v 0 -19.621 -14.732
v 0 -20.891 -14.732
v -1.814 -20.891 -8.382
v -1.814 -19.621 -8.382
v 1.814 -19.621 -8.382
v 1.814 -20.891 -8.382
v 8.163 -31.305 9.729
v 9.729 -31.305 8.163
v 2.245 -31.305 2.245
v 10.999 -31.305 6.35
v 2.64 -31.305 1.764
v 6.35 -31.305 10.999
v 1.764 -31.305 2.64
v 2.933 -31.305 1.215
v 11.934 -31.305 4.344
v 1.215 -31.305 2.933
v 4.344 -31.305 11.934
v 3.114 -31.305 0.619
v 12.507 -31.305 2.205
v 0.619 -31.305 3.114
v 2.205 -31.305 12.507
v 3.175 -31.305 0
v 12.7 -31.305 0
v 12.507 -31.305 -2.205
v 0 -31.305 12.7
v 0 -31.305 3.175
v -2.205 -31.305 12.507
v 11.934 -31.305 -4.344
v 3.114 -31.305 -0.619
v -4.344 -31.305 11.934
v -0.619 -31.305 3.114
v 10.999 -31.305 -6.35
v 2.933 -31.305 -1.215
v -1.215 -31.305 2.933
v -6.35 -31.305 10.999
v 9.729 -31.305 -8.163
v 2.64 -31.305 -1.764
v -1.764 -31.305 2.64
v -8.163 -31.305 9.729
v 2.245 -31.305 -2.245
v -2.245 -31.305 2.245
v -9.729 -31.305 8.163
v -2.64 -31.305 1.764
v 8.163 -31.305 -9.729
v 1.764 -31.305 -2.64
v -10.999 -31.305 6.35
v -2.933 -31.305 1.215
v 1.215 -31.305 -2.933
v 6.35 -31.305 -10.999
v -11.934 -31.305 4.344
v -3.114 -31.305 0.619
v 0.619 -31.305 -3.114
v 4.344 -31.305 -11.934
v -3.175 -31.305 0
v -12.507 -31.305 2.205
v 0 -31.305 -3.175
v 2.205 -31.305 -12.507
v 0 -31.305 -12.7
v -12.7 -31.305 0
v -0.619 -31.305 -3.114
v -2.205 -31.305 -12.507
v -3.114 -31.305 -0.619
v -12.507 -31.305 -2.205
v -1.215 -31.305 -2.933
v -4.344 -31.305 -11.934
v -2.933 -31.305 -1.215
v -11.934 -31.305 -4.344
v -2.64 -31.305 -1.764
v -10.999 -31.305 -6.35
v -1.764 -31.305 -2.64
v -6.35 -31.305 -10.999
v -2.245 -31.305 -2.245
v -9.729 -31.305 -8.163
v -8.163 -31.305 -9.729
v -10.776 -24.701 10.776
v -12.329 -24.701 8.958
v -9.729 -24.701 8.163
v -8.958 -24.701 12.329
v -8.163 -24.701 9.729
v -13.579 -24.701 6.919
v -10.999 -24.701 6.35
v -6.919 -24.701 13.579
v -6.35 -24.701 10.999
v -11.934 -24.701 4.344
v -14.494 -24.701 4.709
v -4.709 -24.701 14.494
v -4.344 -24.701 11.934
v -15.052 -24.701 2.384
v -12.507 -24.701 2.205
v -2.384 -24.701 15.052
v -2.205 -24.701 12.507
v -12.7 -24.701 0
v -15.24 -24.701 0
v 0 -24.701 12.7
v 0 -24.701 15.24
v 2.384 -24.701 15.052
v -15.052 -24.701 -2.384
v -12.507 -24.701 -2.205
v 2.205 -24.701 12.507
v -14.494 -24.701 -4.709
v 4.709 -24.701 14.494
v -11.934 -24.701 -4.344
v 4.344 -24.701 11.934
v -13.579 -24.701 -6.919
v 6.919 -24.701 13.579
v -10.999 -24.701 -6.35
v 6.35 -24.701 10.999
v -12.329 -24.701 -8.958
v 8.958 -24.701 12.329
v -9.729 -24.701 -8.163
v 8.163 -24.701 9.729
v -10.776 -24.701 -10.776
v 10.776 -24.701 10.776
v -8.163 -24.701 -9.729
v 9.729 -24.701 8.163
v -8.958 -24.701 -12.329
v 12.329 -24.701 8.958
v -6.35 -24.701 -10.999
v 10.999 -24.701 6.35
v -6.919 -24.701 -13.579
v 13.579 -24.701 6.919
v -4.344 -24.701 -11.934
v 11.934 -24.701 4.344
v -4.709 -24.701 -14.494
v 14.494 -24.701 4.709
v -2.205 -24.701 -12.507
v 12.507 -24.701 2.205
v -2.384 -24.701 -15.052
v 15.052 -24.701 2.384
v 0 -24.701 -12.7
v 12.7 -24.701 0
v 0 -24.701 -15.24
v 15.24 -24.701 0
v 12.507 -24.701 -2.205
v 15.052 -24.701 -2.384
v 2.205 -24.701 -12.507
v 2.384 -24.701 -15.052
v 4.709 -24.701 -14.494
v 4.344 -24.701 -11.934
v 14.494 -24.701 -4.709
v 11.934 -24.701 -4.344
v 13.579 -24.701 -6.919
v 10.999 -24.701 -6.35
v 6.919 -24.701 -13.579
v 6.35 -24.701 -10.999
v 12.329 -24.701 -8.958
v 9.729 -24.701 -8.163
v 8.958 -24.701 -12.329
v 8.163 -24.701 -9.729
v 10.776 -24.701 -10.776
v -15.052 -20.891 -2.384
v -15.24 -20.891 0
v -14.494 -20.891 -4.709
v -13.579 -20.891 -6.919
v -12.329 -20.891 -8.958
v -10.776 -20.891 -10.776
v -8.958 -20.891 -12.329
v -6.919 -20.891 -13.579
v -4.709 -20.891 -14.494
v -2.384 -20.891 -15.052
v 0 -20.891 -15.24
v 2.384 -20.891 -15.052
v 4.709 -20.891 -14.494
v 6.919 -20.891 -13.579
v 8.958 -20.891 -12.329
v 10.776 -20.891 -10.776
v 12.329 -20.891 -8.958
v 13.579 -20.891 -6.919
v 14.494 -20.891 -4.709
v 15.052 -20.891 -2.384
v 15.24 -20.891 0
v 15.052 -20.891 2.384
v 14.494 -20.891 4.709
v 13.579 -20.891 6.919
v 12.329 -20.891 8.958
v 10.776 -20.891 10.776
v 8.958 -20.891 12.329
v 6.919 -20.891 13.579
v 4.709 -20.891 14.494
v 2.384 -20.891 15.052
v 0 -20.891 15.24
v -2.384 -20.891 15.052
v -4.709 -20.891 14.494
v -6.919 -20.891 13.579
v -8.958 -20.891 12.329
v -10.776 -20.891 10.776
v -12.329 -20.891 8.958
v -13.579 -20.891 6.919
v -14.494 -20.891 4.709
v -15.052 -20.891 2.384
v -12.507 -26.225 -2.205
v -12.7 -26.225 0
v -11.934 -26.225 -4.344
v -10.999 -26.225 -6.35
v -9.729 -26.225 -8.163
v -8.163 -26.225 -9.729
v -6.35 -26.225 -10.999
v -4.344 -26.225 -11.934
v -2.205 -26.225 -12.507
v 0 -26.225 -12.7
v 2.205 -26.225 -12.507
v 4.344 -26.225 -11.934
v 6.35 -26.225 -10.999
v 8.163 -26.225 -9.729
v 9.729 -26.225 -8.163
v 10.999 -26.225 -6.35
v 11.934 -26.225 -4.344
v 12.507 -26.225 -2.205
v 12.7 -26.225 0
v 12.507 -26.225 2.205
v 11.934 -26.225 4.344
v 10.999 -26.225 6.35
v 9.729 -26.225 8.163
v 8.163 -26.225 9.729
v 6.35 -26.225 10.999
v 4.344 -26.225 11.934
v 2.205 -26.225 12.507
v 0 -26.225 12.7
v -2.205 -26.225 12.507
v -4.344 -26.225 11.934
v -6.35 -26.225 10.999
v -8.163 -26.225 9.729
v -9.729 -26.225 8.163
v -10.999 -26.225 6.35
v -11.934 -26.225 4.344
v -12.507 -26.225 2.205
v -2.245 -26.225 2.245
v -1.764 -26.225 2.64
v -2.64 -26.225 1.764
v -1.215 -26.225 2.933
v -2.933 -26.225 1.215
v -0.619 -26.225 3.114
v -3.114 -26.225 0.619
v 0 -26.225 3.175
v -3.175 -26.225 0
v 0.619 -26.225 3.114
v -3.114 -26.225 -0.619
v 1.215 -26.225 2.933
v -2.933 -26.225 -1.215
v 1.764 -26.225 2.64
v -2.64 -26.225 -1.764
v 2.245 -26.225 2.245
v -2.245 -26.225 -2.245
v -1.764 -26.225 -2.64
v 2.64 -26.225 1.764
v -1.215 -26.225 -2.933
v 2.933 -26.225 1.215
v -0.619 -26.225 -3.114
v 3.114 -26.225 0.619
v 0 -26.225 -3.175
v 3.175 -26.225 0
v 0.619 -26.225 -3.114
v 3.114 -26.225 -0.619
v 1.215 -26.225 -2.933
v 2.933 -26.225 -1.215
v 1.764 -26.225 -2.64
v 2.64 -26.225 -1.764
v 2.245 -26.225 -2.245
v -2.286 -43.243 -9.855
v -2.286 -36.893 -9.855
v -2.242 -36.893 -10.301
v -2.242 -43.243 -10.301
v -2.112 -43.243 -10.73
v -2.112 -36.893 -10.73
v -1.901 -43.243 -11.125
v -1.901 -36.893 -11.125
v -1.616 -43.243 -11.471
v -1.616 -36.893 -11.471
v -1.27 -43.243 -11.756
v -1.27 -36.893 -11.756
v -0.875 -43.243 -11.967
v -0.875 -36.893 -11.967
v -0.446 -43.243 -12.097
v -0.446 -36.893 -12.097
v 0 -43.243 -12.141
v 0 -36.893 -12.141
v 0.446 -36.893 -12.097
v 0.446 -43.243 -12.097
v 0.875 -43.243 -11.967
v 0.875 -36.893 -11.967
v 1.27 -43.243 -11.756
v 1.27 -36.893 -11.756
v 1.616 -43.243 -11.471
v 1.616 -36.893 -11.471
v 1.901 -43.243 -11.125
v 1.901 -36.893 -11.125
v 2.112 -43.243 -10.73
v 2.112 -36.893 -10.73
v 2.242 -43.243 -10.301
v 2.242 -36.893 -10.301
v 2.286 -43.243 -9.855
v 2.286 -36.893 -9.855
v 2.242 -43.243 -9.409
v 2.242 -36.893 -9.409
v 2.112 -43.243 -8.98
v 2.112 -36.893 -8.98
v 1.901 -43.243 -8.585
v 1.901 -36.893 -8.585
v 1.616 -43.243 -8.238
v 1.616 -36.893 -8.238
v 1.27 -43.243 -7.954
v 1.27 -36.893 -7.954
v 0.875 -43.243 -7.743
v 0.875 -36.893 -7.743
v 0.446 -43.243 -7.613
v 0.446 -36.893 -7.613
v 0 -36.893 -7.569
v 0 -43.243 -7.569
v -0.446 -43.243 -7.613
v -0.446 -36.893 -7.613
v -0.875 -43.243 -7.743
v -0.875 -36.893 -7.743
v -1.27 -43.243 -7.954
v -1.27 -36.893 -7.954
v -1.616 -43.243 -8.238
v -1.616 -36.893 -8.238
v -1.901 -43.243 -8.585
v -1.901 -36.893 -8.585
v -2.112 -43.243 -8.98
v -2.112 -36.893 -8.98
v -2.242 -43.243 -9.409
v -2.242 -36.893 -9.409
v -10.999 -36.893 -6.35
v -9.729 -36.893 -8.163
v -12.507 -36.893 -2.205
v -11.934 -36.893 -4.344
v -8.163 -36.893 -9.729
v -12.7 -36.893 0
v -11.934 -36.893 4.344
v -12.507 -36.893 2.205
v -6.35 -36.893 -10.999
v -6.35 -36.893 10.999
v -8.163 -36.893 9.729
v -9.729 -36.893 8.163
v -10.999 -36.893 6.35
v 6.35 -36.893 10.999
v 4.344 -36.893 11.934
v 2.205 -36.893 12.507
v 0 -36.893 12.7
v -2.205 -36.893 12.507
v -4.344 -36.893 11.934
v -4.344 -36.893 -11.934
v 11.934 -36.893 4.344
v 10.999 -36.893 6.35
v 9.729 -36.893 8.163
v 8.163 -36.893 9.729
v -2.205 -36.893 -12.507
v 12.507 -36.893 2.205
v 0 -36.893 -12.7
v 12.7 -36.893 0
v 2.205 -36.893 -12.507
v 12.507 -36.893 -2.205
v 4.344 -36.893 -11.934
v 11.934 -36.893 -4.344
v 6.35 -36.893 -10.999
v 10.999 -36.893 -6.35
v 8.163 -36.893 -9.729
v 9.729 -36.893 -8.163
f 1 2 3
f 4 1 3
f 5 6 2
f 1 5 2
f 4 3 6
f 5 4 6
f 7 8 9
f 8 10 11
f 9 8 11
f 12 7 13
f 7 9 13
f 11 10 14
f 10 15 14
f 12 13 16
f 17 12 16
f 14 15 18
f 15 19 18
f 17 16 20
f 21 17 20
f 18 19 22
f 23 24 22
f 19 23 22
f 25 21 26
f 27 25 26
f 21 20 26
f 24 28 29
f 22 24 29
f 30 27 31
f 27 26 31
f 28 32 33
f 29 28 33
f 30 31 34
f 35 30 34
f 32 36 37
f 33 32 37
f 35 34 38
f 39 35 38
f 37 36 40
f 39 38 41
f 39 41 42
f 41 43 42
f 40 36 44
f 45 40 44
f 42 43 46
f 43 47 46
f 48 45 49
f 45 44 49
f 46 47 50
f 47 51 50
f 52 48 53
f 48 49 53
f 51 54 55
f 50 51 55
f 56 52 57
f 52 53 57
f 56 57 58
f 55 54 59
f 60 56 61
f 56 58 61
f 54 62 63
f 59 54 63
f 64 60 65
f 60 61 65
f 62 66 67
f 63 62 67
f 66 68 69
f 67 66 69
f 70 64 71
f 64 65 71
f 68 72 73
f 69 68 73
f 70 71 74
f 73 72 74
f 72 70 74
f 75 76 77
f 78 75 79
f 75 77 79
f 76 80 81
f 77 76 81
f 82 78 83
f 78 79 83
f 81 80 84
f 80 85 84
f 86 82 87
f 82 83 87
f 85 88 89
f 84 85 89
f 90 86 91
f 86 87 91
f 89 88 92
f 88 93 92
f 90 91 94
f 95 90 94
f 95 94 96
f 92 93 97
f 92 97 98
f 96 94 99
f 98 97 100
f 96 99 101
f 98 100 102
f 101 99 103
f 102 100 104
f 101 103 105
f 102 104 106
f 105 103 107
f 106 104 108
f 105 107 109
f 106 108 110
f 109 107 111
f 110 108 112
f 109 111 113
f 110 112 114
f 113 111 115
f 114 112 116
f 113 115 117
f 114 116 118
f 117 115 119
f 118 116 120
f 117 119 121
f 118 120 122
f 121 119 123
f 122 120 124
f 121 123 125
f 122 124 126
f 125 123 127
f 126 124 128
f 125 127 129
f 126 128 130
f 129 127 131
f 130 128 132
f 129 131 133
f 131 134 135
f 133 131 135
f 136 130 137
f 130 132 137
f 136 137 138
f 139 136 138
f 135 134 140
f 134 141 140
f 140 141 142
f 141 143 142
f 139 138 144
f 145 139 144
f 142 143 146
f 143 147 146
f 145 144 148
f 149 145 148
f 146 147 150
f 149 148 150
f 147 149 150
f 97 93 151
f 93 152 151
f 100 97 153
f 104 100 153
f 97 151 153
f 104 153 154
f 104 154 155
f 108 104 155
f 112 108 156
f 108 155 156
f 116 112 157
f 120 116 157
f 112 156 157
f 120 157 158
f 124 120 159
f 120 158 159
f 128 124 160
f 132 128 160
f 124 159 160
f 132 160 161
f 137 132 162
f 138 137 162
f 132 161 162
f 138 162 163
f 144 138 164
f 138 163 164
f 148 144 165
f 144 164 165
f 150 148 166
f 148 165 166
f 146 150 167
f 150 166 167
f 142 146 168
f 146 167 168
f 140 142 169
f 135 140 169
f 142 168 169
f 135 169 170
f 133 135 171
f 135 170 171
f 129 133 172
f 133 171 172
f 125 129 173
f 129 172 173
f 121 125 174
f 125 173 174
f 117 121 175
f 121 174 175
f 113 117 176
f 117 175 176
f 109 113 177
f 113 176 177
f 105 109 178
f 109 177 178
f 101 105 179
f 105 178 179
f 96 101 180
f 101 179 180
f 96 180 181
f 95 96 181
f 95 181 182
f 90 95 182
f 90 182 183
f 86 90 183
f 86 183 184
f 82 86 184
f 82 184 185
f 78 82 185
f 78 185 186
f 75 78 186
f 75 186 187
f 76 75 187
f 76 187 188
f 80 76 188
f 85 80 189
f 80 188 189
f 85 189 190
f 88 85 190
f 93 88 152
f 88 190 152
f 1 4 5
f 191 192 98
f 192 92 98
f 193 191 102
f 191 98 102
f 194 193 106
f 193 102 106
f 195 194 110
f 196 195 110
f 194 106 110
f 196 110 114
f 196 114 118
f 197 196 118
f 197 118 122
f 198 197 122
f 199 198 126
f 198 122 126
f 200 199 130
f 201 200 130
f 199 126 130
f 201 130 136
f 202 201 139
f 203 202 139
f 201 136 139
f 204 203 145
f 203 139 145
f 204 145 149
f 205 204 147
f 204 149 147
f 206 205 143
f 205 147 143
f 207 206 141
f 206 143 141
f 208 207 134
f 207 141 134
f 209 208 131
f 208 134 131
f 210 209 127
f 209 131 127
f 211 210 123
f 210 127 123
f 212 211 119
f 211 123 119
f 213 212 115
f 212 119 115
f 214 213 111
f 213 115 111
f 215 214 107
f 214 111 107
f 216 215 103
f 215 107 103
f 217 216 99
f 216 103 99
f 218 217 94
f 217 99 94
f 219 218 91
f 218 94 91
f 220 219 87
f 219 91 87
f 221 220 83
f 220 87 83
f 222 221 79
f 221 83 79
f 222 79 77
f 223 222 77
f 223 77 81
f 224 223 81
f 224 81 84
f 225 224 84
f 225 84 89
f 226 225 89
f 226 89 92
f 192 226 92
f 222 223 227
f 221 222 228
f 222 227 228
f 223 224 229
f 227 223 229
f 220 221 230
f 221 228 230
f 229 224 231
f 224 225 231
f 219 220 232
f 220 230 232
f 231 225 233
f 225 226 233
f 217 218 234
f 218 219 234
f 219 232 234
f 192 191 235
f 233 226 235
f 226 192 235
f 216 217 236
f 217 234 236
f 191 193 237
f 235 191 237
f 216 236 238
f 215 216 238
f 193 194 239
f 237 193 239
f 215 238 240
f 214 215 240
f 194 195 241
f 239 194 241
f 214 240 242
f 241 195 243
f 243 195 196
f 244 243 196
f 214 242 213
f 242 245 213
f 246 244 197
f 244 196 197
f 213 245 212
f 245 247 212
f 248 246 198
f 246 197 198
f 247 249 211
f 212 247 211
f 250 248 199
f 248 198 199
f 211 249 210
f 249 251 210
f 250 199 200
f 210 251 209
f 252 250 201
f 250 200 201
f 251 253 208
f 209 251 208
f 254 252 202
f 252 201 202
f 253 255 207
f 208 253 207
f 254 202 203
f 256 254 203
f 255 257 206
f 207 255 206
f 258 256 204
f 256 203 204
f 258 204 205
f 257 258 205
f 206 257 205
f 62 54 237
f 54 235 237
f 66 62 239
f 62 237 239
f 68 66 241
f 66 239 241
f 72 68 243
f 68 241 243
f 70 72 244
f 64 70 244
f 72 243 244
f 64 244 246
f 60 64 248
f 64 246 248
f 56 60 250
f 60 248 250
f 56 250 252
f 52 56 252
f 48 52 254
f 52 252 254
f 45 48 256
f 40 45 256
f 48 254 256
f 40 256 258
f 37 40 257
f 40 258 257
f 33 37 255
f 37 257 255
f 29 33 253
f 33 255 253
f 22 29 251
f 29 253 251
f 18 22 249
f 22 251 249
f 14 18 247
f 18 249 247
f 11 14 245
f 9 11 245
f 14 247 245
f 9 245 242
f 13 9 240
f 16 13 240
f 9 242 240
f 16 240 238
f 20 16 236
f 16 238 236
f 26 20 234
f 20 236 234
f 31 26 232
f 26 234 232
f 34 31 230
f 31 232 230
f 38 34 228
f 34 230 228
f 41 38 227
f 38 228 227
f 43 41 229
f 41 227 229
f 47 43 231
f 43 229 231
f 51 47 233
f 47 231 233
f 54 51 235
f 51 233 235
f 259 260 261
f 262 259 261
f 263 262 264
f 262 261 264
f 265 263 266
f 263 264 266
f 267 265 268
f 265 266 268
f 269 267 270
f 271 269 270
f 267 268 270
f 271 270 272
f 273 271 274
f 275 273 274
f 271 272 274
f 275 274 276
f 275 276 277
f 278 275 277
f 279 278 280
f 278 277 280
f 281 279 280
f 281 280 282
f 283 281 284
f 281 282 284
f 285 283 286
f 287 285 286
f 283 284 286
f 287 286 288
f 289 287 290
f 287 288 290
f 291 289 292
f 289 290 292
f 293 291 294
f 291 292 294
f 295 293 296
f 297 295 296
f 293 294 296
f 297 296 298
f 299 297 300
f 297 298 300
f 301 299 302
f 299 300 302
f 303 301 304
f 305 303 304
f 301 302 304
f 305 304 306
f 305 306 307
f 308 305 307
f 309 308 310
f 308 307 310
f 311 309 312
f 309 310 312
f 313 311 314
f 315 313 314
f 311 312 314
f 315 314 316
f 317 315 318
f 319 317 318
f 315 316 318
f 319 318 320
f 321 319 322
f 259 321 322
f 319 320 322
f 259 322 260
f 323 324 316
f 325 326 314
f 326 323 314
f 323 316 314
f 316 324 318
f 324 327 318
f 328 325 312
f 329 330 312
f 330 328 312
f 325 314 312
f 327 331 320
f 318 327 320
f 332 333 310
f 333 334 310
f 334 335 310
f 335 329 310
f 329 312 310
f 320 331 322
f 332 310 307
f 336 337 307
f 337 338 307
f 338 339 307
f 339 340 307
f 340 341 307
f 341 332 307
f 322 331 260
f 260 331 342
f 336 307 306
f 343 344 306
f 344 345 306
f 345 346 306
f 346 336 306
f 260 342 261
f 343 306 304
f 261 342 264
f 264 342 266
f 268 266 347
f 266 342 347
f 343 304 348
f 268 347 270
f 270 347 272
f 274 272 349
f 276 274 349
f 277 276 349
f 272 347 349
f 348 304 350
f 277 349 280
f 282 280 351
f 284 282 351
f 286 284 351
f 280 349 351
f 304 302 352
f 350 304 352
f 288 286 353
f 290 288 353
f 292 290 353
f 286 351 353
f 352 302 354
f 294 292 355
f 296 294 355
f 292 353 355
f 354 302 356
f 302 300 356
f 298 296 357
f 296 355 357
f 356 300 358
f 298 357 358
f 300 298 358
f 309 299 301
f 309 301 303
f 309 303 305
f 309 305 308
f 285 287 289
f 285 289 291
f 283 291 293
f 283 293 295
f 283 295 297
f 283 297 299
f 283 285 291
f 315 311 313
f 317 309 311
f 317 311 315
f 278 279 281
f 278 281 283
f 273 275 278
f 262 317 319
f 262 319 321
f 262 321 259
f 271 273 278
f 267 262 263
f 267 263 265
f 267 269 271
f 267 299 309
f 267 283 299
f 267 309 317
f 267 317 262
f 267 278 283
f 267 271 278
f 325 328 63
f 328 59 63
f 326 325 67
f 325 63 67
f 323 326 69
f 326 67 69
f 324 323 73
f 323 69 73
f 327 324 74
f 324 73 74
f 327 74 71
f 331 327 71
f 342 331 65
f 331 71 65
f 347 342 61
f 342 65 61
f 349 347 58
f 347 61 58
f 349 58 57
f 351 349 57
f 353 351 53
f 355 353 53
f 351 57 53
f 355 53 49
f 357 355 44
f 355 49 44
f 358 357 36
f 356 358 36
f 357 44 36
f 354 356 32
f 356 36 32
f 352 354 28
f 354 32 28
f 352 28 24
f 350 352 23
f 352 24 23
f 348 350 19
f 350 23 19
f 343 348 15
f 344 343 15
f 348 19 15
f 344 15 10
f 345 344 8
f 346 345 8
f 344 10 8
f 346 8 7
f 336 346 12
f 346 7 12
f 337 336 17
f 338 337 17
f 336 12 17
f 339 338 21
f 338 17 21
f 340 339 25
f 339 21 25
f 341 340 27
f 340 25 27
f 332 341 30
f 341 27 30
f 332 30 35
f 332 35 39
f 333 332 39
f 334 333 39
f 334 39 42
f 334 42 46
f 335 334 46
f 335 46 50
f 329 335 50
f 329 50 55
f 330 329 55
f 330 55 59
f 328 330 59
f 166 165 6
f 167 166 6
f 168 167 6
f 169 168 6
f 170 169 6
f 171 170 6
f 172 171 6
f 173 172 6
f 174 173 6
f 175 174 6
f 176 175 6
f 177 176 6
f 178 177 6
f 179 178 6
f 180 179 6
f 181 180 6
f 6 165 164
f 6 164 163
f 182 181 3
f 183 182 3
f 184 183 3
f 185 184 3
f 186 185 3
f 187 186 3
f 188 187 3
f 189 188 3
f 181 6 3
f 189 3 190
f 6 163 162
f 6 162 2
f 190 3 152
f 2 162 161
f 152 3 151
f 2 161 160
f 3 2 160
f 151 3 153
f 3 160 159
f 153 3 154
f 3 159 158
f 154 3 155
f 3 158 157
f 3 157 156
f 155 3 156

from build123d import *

# Parameters (mm, degrees)
ARROW_DEPTH = 1.27
SKETCH3_R   = 2.286
FLAG_DEPTH  = 6.35


with BuildPart() as part:
    # Sketch1 → dial base shape (revolve)
    with BuildSketch(Plane.XY, mode=Mode.PRIVATE) as dial_base_shape_sk:
        Polygon((0, -20.891058424), (0, -36.893058424), (12.7, -36.893058424), (12.7, -31.305058424), (3.175, -31.305058424), (3.175, -26.225058424), (12.7, -26.225058424), (12.7, -24.701058424), (15.24, -24.701058424), (15.24, -20.891058424), align=None)
    revolve(dial_base_shape_sk.sketch.rotate(Axis((0, -20.891058424, 0), (0, -1, 0)), 180), axis=Axis((0, -20.891058424, 0), (0, -1, 0)))

    # Sketch2 → arrow (add)
    with BuildSketch(Plane(origin=(0, -20.891058424, 0), x_dir=(1, 0, 0), z_dir=(0, 1, 0))):
        Polygon((0, 14.732), (-1.813922821, 8.382), (1.813922821, 8.382), align=None)
    extrude(amount=ARROW_DEPTH)

    # Sketch3 → flag (add)
    with BuildSketch(Plane.XZ.offset(36.893058424)):
        with Locations(Location((0, -9.854910999, 0), (0, 0, 180))):
            Circle(SKETCH3_R)
    extrude(amount=FLAG_DEPTH)


solid = part.part
